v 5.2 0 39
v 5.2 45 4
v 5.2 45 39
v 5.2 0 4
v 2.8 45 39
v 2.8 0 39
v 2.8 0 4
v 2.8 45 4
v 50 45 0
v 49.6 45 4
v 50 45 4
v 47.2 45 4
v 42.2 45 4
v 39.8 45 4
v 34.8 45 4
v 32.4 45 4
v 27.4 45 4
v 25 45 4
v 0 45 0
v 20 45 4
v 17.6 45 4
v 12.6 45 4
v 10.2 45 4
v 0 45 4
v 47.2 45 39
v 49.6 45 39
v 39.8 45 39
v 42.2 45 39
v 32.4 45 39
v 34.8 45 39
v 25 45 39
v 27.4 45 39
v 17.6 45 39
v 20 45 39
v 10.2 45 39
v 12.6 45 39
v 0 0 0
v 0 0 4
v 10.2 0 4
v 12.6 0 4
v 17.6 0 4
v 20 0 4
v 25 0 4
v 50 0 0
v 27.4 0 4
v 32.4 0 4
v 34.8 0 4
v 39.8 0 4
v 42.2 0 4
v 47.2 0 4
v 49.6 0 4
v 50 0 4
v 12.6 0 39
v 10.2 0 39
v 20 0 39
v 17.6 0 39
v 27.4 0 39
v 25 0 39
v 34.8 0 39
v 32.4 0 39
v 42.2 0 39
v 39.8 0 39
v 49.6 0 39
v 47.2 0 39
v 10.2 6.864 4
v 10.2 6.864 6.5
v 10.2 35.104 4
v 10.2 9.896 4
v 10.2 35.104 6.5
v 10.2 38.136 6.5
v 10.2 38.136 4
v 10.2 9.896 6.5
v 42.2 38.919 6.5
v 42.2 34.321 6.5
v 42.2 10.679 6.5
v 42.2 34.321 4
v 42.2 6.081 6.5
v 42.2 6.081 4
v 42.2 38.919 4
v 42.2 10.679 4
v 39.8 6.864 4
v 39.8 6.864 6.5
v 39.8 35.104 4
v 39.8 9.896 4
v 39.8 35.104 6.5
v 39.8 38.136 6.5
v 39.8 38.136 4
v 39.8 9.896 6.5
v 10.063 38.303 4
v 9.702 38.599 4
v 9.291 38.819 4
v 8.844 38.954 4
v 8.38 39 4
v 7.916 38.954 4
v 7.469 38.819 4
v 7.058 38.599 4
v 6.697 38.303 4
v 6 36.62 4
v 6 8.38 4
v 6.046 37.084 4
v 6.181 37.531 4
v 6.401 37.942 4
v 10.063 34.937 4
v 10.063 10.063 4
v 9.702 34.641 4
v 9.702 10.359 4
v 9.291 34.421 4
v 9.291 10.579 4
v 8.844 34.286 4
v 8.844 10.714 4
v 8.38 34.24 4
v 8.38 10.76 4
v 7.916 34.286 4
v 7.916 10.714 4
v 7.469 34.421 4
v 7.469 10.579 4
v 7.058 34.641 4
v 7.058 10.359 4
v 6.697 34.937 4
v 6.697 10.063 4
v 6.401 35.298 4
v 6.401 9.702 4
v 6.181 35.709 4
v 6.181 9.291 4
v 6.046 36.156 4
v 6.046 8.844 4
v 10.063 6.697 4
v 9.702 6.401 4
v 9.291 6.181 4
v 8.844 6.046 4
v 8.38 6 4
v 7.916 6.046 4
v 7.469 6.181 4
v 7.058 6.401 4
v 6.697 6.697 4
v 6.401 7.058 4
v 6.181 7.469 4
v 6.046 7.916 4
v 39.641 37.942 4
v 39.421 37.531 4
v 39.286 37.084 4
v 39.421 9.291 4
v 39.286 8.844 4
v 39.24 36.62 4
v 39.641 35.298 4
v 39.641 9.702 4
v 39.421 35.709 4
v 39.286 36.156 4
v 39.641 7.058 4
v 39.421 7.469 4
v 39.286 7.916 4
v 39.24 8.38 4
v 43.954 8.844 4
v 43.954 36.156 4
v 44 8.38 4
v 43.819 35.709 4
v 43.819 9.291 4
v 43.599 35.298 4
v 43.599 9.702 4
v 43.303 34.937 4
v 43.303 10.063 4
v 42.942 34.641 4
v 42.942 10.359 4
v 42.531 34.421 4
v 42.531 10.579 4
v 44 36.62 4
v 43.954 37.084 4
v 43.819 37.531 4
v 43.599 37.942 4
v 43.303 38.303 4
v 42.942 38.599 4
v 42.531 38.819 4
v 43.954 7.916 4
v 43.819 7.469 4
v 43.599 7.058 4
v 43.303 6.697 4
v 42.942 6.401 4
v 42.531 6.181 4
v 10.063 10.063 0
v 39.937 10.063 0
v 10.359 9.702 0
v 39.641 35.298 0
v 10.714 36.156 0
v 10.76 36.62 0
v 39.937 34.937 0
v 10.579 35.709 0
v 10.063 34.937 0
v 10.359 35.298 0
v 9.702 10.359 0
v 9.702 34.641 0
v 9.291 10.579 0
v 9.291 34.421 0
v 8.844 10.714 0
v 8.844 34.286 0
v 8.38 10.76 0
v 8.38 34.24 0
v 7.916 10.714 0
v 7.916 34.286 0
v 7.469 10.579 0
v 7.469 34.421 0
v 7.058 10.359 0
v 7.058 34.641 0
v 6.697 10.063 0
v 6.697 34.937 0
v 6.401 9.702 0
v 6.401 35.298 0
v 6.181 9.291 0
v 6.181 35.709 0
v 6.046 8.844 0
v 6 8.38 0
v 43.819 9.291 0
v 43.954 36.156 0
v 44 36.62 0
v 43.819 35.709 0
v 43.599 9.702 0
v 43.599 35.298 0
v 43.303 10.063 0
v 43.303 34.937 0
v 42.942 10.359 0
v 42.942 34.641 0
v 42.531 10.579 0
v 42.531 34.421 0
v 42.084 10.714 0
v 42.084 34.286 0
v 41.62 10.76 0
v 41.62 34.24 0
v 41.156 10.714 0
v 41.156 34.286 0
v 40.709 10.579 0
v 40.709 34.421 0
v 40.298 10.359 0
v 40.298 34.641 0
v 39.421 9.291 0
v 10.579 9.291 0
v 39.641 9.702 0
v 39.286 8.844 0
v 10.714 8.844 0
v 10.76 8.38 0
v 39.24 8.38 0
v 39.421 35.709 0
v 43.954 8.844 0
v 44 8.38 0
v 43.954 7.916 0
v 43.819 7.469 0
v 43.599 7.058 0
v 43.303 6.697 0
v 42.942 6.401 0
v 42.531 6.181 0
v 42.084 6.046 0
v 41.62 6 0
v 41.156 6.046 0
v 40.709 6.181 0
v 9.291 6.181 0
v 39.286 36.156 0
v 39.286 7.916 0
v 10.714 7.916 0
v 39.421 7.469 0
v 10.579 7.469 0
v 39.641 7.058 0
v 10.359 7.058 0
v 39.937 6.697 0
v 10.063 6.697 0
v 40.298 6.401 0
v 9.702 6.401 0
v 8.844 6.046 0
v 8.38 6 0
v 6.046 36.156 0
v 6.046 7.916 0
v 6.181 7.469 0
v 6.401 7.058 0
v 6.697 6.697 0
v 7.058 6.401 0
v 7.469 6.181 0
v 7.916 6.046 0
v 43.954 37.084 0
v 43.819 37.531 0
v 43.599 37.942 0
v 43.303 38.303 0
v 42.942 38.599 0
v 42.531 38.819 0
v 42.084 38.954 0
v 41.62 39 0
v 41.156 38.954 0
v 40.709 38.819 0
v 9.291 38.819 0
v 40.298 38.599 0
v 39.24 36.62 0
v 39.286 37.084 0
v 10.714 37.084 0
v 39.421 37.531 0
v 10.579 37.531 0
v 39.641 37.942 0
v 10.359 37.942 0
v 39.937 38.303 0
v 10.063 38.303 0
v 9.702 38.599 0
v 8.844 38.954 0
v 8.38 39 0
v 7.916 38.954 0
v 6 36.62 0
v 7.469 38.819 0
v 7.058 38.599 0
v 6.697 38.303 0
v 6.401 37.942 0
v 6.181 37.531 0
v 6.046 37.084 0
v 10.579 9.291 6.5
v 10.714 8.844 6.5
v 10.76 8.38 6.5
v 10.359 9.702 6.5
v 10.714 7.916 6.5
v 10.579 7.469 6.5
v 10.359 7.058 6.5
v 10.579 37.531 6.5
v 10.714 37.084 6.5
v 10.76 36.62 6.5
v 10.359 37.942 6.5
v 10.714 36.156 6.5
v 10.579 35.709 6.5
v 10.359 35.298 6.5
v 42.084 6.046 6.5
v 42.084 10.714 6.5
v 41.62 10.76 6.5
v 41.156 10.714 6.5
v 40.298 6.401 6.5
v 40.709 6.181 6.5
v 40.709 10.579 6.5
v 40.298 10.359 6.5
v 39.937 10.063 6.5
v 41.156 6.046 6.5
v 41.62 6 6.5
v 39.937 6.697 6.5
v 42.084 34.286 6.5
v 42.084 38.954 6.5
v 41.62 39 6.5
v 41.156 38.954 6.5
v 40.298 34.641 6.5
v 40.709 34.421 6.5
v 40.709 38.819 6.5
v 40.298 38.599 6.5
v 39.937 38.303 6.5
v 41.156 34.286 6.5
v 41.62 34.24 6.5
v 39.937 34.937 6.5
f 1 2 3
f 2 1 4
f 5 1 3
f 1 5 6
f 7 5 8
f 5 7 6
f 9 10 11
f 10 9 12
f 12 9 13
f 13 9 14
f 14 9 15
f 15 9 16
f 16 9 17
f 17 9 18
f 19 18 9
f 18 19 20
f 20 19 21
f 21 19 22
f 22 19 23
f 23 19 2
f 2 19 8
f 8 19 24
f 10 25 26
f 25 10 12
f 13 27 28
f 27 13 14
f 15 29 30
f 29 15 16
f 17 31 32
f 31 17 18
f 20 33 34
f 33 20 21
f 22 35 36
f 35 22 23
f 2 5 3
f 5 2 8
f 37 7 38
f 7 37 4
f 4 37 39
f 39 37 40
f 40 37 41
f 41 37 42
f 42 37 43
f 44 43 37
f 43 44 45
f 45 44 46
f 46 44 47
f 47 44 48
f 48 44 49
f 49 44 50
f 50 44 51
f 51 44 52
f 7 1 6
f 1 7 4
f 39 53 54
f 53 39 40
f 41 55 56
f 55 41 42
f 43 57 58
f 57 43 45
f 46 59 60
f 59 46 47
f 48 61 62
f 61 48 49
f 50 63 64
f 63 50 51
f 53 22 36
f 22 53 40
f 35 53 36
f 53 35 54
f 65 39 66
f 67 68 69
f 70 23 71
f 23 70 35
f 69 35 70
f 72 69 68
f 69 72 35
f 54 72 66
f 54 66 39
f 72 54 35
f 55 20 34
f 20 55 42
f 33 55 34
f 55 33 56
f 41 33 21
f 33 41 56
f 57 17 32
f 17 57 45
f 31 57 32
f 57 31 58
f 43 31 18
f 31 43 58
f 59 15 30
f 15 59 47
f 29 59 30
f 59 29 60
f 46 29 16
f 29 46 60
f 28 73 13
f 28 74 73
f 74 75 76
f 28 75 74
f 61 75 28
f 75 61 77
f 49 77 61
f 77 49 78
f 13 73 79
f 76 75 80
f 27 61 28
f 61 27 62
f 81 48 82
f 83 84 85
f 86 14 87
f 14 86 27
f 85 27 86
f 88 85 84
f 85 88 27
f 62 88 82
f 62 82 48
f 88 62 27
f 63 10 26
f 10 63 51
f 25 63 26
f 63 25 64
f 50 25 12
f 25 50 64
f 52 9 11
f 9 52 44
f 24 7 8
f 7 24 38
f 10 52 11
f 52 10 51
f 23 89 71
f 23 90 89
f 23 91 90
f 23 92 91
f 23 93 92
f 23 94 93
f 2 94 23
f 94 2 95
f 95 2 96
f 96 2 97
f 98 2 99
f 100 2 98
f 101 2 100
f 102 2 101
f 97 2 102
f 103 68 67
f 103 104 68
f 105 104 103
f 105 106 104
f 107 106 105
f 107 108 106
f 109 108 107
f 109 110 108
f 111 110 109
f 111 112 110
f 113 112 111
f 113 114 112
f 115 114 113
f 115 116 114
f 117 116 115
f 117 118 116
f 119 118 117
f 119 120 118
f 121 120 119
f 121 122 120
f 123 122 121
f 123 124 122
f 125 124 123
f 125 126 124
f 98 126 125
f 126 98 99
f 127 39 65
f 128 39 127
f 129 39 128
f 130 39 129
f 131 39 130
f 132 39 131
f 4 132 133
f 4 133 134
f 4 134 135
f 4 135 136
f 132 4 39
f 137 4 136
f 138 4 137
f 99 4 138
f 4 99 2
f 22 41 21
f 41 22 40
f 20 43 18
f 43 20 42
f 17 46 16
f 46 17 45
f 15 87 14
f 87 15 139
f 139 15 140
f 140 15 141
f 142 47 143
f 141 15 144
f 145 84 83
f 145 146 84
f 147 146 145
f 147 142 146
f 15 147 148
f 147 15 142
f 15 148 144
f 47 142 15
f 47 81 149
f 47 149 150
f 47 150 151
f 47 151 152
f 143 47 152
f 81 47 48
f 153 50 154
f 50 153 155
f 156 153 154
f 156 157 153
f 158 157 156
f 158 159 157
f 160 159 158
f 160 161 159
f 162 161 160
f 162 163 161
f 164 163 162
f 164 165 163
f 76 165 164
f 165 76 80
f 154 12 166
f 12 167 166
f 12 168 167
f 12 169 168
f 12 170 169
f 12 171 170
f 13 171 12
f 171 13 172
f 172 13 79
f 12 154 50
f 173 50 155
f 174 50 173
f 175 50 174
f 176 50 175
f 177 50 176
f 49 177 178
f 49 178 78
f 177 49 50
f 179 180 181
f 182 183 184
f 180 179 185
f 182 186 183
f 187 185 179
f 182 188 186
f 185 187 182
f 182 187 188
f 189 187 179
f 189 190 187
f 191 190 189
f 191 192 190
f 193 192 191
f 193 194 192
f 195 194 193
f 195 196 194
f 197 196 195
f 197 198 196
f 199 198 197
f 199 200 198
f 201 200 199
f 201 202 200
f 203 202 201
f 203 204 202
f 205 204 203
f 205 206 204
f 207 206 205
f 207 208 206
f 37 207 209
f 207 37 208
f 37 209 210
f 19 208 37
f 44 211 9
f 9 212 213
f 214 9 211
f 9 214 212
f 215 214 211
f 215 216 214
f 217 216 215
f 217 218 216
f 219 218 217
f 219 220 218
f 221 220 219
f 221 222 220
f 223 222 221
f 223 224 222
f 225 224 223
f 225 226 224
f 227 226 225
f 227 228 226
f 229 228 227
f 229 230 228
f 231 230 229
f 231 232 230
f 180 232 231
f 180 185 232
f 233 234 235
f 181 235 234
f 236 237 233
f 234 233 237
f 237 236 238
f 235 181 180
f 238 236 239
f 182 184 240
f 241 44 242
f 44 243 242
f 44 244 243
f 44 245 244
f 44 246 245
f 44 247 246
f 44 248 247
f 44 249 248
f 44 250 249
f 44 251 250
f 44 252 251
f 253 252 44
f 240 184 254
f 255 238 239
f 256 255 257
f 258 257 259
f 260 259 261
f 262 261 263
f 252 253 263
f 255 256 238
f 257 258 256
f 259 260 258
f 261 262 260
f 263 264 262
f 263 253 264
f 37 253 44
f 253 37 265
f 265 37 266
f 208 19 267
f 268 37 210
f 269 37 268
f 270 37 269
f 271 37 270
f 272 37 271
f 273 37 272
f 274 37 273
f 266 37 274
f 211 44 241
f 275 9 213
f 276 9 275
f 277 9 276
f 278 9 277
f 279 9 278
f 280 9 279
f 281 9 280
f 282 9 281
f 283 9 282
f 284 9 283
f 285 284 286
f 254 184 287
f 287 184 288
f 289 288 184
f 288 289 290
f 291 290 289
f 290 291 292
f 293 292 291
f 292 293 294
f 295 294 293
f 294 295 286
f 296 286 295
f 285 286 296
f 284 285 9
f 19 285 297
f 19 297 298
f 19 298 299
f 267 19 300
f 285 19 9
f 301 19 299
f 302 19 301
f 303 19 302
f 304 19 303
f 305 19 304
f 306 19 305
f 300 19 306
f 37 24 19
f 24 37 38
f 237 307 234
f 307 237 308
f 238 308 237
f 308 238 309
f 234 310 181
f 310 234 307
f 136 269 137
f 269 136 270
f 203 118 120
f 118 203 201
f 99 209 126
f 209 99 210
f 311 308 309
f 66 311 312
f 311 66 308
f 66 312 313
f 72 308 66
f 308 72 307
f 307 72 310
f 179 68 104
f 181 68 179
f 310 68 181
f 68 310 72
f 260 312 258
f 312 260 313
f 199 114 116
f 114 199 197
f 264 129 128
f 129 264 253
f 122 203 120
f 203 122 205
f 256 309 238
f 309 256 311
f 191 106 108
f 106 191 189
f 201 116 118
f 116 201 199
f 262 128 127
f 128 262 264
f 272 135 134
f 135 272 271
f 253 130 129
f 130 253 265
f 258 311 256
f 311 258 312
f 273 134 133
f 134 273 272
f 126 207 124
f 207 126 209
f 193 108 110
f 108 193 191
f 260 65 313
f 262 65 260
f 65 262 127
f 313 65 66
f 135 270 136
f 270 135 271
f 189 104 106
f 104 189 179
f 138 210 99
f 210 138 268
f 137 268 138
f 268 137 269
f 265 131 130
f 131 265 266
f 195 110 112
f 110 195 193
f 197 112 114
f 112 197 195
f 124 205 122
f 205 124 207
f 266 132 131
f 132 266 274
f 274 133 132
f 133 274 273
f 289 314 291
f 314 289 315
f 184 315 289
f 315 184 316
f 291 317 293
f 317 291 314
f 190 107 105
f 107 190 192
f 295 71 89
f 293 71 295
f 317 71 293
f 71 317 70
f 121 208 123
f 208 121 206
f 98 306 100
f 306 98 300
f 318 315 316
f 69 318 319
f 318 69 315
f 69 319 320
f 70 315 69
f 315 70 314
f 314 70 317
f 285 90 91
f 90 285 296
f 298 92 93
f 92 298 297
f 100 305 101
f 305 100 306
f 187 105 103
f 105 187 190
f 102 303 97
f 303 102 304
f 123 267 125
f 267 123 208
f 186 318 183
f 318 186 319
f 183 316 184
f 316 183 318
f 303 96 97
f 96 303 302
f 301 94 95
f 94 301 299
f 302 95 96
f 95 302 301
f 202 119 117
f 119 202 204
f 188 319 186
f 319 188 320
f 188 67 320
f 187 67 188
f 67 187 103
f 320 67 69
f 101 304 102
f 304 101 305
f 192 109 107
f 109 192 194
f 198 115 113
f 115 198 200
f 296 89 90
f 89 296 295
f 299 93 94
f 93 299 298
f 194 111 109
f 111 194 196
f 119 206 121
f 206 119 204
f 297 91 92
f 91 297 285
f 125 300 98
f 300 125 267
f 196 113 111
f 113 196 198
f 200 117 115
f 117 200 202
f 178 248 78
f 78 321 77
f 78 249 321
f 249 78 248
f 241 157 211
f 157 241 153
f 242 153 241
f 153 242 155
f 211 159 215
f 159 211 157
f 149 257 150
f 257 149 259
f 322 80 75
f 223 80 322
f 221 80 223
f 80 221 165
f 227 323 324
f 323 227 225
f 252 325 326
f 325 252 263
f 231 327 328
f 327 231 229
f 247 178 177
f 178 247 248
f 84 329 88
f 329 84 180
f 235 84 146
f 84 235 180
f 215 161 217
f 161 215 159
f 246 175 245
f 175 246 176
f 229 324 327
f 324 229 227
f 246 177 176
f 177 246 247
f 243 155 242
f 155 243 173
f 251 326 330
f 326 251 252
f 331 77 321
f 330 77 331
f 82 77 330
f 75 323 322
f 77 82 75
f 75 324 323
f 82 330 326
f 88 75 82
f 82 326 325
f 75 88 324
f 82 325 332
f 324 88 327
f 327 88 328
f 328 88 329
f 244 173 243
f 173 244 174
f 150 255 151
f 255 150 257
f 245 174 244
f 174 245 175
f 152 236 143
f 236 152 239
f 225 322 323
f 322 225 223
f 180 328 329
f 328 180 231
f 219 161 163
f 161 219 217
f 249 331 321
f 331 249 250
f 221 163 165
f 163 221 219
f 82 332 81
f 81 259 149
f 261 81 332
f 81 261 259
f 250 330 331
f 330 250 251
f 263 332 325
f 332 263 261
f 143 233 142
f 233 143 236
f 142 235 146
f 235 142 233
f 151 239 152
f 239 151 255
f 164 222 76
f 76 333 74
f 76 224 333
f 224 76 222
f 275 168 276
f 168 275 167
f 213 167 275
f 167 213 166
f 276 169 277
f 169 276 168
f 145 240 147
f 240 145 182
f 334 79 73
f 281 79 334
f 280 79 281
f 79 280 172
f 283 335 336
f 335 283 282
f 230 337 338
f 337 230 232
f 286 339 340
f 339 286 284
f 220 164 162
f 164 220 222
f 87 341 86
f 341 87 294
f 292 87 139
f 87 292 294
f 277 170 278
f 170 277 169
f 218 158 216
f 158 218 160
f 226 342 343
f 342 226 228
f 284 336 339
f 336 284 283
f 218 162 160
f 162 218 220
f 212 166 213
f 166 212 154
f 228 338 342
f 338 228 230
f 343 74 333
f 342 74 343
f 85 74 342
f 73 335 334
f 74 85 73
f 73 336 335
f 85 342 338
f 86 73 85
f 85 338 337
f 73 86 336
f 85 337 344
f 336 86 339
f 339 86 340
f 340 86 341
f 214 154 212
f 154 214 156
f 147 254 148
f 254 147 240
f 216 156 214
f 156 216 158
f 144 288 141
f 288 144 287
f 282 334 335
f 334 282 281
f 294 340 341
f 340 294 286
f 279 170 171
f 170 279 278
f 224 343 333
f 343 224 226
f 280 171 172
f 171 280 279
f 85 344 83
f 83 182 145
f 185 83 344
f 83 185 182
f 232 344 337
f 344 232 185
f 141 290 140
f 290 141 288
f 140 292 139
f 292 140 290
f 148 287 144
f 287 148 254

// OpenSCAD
$fn = 32;

// ----------------------------------------------------------------------
// Finned heat sink: 50 x 45 mm base, 35 mm fins
// ----------------------------------------------------------------------

// --- parameters (mm) ---
base_w = 50;              // base width
base_d = 45;              // base depth
base_t = 4;               // base thickness
fin_h = 35;               // fin height above the base
holes_d = 4.76;           // fixing holes
hole_x = 16.62;           // hole offset in x
hole_y = 14.12;           // hole offset in y
fin_t = 2.4;              // fin thickness
fin_pitch = 7.4;          // fin pitch
fin_count = 7;            // number of fins
fin_x0 = 2.8;             // first fin offset

difference() {
  union() {
    cube([base_w, base_d, base_t]);
    for (i = [0 : fin_count - 1]) {
      translate([fin_x0 + i * fin_pitch, 0, base_t - 0.5]) cube([fin_t, base_d, fin_h + 0.5]);
    }
  }
  /* fixing holes through the base, 2.5 mm clear on both sides */
  for (hx = [-16.62, 16.62]) {
    for (hy = [-14.12, 14.12]) {
      translate([base_w / 2 + hx, base_d / 2 + hy, -2.5]) cylinder(h = base_t + 5, d = holes_d);
    }
  }
}
